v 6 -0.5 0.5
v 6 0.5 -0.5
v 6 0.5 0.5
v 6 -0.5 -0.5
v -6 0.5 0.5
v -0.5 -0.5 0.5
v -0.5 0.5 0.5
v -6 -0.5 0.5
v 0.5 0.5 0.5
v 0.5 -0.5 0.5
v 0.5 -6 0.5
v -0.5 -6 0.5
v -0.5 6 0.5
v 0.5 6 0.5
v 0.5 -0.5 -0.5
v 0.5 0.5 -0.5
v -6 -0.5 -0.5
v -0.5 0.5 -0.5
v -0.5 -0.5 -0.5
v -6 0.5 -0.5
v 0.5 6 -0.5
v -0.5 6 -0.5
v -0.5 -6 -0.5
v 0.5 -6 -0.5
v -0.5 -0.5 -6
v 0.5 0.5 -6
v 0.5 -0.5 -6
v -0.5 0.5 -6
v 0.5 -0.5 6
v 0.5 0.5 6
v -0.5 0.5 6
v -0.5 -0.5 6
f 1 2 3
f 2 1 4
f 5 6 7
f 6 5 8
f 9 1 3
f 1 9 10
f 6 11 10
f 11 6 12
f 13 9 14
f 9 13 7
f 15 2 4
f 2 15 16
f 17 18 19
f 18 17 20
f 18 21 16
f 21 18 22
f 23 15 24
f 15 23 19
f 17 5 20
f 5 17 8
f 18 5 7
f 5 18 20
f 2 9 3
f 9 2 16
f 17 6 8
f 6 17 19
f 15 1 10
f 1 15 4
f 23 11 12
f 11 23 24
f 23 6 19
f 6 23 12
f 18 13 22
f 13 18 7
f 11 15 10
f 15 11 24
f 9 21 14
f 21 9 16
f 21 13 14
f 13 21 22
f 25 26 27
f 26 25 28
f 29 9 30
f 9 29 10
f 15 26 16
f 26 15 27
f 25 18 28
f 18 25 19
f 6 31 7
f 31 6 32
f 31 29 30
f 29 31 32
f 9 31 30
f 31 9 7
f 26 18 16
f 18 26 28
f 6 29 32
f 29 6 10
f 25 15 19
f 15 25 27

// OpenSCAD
module ToggleAxisAlignedIcon() {
  module Axis_() {
    kL = 6;
    cube([2 * kL, 1, 1], center = true);
  }
  Axis_();
  rotate([0, 0, 90]) Axis_();
  rotate([0, 90, 0]) Axis_();
}

ToggleAxisAlignedIcon();
